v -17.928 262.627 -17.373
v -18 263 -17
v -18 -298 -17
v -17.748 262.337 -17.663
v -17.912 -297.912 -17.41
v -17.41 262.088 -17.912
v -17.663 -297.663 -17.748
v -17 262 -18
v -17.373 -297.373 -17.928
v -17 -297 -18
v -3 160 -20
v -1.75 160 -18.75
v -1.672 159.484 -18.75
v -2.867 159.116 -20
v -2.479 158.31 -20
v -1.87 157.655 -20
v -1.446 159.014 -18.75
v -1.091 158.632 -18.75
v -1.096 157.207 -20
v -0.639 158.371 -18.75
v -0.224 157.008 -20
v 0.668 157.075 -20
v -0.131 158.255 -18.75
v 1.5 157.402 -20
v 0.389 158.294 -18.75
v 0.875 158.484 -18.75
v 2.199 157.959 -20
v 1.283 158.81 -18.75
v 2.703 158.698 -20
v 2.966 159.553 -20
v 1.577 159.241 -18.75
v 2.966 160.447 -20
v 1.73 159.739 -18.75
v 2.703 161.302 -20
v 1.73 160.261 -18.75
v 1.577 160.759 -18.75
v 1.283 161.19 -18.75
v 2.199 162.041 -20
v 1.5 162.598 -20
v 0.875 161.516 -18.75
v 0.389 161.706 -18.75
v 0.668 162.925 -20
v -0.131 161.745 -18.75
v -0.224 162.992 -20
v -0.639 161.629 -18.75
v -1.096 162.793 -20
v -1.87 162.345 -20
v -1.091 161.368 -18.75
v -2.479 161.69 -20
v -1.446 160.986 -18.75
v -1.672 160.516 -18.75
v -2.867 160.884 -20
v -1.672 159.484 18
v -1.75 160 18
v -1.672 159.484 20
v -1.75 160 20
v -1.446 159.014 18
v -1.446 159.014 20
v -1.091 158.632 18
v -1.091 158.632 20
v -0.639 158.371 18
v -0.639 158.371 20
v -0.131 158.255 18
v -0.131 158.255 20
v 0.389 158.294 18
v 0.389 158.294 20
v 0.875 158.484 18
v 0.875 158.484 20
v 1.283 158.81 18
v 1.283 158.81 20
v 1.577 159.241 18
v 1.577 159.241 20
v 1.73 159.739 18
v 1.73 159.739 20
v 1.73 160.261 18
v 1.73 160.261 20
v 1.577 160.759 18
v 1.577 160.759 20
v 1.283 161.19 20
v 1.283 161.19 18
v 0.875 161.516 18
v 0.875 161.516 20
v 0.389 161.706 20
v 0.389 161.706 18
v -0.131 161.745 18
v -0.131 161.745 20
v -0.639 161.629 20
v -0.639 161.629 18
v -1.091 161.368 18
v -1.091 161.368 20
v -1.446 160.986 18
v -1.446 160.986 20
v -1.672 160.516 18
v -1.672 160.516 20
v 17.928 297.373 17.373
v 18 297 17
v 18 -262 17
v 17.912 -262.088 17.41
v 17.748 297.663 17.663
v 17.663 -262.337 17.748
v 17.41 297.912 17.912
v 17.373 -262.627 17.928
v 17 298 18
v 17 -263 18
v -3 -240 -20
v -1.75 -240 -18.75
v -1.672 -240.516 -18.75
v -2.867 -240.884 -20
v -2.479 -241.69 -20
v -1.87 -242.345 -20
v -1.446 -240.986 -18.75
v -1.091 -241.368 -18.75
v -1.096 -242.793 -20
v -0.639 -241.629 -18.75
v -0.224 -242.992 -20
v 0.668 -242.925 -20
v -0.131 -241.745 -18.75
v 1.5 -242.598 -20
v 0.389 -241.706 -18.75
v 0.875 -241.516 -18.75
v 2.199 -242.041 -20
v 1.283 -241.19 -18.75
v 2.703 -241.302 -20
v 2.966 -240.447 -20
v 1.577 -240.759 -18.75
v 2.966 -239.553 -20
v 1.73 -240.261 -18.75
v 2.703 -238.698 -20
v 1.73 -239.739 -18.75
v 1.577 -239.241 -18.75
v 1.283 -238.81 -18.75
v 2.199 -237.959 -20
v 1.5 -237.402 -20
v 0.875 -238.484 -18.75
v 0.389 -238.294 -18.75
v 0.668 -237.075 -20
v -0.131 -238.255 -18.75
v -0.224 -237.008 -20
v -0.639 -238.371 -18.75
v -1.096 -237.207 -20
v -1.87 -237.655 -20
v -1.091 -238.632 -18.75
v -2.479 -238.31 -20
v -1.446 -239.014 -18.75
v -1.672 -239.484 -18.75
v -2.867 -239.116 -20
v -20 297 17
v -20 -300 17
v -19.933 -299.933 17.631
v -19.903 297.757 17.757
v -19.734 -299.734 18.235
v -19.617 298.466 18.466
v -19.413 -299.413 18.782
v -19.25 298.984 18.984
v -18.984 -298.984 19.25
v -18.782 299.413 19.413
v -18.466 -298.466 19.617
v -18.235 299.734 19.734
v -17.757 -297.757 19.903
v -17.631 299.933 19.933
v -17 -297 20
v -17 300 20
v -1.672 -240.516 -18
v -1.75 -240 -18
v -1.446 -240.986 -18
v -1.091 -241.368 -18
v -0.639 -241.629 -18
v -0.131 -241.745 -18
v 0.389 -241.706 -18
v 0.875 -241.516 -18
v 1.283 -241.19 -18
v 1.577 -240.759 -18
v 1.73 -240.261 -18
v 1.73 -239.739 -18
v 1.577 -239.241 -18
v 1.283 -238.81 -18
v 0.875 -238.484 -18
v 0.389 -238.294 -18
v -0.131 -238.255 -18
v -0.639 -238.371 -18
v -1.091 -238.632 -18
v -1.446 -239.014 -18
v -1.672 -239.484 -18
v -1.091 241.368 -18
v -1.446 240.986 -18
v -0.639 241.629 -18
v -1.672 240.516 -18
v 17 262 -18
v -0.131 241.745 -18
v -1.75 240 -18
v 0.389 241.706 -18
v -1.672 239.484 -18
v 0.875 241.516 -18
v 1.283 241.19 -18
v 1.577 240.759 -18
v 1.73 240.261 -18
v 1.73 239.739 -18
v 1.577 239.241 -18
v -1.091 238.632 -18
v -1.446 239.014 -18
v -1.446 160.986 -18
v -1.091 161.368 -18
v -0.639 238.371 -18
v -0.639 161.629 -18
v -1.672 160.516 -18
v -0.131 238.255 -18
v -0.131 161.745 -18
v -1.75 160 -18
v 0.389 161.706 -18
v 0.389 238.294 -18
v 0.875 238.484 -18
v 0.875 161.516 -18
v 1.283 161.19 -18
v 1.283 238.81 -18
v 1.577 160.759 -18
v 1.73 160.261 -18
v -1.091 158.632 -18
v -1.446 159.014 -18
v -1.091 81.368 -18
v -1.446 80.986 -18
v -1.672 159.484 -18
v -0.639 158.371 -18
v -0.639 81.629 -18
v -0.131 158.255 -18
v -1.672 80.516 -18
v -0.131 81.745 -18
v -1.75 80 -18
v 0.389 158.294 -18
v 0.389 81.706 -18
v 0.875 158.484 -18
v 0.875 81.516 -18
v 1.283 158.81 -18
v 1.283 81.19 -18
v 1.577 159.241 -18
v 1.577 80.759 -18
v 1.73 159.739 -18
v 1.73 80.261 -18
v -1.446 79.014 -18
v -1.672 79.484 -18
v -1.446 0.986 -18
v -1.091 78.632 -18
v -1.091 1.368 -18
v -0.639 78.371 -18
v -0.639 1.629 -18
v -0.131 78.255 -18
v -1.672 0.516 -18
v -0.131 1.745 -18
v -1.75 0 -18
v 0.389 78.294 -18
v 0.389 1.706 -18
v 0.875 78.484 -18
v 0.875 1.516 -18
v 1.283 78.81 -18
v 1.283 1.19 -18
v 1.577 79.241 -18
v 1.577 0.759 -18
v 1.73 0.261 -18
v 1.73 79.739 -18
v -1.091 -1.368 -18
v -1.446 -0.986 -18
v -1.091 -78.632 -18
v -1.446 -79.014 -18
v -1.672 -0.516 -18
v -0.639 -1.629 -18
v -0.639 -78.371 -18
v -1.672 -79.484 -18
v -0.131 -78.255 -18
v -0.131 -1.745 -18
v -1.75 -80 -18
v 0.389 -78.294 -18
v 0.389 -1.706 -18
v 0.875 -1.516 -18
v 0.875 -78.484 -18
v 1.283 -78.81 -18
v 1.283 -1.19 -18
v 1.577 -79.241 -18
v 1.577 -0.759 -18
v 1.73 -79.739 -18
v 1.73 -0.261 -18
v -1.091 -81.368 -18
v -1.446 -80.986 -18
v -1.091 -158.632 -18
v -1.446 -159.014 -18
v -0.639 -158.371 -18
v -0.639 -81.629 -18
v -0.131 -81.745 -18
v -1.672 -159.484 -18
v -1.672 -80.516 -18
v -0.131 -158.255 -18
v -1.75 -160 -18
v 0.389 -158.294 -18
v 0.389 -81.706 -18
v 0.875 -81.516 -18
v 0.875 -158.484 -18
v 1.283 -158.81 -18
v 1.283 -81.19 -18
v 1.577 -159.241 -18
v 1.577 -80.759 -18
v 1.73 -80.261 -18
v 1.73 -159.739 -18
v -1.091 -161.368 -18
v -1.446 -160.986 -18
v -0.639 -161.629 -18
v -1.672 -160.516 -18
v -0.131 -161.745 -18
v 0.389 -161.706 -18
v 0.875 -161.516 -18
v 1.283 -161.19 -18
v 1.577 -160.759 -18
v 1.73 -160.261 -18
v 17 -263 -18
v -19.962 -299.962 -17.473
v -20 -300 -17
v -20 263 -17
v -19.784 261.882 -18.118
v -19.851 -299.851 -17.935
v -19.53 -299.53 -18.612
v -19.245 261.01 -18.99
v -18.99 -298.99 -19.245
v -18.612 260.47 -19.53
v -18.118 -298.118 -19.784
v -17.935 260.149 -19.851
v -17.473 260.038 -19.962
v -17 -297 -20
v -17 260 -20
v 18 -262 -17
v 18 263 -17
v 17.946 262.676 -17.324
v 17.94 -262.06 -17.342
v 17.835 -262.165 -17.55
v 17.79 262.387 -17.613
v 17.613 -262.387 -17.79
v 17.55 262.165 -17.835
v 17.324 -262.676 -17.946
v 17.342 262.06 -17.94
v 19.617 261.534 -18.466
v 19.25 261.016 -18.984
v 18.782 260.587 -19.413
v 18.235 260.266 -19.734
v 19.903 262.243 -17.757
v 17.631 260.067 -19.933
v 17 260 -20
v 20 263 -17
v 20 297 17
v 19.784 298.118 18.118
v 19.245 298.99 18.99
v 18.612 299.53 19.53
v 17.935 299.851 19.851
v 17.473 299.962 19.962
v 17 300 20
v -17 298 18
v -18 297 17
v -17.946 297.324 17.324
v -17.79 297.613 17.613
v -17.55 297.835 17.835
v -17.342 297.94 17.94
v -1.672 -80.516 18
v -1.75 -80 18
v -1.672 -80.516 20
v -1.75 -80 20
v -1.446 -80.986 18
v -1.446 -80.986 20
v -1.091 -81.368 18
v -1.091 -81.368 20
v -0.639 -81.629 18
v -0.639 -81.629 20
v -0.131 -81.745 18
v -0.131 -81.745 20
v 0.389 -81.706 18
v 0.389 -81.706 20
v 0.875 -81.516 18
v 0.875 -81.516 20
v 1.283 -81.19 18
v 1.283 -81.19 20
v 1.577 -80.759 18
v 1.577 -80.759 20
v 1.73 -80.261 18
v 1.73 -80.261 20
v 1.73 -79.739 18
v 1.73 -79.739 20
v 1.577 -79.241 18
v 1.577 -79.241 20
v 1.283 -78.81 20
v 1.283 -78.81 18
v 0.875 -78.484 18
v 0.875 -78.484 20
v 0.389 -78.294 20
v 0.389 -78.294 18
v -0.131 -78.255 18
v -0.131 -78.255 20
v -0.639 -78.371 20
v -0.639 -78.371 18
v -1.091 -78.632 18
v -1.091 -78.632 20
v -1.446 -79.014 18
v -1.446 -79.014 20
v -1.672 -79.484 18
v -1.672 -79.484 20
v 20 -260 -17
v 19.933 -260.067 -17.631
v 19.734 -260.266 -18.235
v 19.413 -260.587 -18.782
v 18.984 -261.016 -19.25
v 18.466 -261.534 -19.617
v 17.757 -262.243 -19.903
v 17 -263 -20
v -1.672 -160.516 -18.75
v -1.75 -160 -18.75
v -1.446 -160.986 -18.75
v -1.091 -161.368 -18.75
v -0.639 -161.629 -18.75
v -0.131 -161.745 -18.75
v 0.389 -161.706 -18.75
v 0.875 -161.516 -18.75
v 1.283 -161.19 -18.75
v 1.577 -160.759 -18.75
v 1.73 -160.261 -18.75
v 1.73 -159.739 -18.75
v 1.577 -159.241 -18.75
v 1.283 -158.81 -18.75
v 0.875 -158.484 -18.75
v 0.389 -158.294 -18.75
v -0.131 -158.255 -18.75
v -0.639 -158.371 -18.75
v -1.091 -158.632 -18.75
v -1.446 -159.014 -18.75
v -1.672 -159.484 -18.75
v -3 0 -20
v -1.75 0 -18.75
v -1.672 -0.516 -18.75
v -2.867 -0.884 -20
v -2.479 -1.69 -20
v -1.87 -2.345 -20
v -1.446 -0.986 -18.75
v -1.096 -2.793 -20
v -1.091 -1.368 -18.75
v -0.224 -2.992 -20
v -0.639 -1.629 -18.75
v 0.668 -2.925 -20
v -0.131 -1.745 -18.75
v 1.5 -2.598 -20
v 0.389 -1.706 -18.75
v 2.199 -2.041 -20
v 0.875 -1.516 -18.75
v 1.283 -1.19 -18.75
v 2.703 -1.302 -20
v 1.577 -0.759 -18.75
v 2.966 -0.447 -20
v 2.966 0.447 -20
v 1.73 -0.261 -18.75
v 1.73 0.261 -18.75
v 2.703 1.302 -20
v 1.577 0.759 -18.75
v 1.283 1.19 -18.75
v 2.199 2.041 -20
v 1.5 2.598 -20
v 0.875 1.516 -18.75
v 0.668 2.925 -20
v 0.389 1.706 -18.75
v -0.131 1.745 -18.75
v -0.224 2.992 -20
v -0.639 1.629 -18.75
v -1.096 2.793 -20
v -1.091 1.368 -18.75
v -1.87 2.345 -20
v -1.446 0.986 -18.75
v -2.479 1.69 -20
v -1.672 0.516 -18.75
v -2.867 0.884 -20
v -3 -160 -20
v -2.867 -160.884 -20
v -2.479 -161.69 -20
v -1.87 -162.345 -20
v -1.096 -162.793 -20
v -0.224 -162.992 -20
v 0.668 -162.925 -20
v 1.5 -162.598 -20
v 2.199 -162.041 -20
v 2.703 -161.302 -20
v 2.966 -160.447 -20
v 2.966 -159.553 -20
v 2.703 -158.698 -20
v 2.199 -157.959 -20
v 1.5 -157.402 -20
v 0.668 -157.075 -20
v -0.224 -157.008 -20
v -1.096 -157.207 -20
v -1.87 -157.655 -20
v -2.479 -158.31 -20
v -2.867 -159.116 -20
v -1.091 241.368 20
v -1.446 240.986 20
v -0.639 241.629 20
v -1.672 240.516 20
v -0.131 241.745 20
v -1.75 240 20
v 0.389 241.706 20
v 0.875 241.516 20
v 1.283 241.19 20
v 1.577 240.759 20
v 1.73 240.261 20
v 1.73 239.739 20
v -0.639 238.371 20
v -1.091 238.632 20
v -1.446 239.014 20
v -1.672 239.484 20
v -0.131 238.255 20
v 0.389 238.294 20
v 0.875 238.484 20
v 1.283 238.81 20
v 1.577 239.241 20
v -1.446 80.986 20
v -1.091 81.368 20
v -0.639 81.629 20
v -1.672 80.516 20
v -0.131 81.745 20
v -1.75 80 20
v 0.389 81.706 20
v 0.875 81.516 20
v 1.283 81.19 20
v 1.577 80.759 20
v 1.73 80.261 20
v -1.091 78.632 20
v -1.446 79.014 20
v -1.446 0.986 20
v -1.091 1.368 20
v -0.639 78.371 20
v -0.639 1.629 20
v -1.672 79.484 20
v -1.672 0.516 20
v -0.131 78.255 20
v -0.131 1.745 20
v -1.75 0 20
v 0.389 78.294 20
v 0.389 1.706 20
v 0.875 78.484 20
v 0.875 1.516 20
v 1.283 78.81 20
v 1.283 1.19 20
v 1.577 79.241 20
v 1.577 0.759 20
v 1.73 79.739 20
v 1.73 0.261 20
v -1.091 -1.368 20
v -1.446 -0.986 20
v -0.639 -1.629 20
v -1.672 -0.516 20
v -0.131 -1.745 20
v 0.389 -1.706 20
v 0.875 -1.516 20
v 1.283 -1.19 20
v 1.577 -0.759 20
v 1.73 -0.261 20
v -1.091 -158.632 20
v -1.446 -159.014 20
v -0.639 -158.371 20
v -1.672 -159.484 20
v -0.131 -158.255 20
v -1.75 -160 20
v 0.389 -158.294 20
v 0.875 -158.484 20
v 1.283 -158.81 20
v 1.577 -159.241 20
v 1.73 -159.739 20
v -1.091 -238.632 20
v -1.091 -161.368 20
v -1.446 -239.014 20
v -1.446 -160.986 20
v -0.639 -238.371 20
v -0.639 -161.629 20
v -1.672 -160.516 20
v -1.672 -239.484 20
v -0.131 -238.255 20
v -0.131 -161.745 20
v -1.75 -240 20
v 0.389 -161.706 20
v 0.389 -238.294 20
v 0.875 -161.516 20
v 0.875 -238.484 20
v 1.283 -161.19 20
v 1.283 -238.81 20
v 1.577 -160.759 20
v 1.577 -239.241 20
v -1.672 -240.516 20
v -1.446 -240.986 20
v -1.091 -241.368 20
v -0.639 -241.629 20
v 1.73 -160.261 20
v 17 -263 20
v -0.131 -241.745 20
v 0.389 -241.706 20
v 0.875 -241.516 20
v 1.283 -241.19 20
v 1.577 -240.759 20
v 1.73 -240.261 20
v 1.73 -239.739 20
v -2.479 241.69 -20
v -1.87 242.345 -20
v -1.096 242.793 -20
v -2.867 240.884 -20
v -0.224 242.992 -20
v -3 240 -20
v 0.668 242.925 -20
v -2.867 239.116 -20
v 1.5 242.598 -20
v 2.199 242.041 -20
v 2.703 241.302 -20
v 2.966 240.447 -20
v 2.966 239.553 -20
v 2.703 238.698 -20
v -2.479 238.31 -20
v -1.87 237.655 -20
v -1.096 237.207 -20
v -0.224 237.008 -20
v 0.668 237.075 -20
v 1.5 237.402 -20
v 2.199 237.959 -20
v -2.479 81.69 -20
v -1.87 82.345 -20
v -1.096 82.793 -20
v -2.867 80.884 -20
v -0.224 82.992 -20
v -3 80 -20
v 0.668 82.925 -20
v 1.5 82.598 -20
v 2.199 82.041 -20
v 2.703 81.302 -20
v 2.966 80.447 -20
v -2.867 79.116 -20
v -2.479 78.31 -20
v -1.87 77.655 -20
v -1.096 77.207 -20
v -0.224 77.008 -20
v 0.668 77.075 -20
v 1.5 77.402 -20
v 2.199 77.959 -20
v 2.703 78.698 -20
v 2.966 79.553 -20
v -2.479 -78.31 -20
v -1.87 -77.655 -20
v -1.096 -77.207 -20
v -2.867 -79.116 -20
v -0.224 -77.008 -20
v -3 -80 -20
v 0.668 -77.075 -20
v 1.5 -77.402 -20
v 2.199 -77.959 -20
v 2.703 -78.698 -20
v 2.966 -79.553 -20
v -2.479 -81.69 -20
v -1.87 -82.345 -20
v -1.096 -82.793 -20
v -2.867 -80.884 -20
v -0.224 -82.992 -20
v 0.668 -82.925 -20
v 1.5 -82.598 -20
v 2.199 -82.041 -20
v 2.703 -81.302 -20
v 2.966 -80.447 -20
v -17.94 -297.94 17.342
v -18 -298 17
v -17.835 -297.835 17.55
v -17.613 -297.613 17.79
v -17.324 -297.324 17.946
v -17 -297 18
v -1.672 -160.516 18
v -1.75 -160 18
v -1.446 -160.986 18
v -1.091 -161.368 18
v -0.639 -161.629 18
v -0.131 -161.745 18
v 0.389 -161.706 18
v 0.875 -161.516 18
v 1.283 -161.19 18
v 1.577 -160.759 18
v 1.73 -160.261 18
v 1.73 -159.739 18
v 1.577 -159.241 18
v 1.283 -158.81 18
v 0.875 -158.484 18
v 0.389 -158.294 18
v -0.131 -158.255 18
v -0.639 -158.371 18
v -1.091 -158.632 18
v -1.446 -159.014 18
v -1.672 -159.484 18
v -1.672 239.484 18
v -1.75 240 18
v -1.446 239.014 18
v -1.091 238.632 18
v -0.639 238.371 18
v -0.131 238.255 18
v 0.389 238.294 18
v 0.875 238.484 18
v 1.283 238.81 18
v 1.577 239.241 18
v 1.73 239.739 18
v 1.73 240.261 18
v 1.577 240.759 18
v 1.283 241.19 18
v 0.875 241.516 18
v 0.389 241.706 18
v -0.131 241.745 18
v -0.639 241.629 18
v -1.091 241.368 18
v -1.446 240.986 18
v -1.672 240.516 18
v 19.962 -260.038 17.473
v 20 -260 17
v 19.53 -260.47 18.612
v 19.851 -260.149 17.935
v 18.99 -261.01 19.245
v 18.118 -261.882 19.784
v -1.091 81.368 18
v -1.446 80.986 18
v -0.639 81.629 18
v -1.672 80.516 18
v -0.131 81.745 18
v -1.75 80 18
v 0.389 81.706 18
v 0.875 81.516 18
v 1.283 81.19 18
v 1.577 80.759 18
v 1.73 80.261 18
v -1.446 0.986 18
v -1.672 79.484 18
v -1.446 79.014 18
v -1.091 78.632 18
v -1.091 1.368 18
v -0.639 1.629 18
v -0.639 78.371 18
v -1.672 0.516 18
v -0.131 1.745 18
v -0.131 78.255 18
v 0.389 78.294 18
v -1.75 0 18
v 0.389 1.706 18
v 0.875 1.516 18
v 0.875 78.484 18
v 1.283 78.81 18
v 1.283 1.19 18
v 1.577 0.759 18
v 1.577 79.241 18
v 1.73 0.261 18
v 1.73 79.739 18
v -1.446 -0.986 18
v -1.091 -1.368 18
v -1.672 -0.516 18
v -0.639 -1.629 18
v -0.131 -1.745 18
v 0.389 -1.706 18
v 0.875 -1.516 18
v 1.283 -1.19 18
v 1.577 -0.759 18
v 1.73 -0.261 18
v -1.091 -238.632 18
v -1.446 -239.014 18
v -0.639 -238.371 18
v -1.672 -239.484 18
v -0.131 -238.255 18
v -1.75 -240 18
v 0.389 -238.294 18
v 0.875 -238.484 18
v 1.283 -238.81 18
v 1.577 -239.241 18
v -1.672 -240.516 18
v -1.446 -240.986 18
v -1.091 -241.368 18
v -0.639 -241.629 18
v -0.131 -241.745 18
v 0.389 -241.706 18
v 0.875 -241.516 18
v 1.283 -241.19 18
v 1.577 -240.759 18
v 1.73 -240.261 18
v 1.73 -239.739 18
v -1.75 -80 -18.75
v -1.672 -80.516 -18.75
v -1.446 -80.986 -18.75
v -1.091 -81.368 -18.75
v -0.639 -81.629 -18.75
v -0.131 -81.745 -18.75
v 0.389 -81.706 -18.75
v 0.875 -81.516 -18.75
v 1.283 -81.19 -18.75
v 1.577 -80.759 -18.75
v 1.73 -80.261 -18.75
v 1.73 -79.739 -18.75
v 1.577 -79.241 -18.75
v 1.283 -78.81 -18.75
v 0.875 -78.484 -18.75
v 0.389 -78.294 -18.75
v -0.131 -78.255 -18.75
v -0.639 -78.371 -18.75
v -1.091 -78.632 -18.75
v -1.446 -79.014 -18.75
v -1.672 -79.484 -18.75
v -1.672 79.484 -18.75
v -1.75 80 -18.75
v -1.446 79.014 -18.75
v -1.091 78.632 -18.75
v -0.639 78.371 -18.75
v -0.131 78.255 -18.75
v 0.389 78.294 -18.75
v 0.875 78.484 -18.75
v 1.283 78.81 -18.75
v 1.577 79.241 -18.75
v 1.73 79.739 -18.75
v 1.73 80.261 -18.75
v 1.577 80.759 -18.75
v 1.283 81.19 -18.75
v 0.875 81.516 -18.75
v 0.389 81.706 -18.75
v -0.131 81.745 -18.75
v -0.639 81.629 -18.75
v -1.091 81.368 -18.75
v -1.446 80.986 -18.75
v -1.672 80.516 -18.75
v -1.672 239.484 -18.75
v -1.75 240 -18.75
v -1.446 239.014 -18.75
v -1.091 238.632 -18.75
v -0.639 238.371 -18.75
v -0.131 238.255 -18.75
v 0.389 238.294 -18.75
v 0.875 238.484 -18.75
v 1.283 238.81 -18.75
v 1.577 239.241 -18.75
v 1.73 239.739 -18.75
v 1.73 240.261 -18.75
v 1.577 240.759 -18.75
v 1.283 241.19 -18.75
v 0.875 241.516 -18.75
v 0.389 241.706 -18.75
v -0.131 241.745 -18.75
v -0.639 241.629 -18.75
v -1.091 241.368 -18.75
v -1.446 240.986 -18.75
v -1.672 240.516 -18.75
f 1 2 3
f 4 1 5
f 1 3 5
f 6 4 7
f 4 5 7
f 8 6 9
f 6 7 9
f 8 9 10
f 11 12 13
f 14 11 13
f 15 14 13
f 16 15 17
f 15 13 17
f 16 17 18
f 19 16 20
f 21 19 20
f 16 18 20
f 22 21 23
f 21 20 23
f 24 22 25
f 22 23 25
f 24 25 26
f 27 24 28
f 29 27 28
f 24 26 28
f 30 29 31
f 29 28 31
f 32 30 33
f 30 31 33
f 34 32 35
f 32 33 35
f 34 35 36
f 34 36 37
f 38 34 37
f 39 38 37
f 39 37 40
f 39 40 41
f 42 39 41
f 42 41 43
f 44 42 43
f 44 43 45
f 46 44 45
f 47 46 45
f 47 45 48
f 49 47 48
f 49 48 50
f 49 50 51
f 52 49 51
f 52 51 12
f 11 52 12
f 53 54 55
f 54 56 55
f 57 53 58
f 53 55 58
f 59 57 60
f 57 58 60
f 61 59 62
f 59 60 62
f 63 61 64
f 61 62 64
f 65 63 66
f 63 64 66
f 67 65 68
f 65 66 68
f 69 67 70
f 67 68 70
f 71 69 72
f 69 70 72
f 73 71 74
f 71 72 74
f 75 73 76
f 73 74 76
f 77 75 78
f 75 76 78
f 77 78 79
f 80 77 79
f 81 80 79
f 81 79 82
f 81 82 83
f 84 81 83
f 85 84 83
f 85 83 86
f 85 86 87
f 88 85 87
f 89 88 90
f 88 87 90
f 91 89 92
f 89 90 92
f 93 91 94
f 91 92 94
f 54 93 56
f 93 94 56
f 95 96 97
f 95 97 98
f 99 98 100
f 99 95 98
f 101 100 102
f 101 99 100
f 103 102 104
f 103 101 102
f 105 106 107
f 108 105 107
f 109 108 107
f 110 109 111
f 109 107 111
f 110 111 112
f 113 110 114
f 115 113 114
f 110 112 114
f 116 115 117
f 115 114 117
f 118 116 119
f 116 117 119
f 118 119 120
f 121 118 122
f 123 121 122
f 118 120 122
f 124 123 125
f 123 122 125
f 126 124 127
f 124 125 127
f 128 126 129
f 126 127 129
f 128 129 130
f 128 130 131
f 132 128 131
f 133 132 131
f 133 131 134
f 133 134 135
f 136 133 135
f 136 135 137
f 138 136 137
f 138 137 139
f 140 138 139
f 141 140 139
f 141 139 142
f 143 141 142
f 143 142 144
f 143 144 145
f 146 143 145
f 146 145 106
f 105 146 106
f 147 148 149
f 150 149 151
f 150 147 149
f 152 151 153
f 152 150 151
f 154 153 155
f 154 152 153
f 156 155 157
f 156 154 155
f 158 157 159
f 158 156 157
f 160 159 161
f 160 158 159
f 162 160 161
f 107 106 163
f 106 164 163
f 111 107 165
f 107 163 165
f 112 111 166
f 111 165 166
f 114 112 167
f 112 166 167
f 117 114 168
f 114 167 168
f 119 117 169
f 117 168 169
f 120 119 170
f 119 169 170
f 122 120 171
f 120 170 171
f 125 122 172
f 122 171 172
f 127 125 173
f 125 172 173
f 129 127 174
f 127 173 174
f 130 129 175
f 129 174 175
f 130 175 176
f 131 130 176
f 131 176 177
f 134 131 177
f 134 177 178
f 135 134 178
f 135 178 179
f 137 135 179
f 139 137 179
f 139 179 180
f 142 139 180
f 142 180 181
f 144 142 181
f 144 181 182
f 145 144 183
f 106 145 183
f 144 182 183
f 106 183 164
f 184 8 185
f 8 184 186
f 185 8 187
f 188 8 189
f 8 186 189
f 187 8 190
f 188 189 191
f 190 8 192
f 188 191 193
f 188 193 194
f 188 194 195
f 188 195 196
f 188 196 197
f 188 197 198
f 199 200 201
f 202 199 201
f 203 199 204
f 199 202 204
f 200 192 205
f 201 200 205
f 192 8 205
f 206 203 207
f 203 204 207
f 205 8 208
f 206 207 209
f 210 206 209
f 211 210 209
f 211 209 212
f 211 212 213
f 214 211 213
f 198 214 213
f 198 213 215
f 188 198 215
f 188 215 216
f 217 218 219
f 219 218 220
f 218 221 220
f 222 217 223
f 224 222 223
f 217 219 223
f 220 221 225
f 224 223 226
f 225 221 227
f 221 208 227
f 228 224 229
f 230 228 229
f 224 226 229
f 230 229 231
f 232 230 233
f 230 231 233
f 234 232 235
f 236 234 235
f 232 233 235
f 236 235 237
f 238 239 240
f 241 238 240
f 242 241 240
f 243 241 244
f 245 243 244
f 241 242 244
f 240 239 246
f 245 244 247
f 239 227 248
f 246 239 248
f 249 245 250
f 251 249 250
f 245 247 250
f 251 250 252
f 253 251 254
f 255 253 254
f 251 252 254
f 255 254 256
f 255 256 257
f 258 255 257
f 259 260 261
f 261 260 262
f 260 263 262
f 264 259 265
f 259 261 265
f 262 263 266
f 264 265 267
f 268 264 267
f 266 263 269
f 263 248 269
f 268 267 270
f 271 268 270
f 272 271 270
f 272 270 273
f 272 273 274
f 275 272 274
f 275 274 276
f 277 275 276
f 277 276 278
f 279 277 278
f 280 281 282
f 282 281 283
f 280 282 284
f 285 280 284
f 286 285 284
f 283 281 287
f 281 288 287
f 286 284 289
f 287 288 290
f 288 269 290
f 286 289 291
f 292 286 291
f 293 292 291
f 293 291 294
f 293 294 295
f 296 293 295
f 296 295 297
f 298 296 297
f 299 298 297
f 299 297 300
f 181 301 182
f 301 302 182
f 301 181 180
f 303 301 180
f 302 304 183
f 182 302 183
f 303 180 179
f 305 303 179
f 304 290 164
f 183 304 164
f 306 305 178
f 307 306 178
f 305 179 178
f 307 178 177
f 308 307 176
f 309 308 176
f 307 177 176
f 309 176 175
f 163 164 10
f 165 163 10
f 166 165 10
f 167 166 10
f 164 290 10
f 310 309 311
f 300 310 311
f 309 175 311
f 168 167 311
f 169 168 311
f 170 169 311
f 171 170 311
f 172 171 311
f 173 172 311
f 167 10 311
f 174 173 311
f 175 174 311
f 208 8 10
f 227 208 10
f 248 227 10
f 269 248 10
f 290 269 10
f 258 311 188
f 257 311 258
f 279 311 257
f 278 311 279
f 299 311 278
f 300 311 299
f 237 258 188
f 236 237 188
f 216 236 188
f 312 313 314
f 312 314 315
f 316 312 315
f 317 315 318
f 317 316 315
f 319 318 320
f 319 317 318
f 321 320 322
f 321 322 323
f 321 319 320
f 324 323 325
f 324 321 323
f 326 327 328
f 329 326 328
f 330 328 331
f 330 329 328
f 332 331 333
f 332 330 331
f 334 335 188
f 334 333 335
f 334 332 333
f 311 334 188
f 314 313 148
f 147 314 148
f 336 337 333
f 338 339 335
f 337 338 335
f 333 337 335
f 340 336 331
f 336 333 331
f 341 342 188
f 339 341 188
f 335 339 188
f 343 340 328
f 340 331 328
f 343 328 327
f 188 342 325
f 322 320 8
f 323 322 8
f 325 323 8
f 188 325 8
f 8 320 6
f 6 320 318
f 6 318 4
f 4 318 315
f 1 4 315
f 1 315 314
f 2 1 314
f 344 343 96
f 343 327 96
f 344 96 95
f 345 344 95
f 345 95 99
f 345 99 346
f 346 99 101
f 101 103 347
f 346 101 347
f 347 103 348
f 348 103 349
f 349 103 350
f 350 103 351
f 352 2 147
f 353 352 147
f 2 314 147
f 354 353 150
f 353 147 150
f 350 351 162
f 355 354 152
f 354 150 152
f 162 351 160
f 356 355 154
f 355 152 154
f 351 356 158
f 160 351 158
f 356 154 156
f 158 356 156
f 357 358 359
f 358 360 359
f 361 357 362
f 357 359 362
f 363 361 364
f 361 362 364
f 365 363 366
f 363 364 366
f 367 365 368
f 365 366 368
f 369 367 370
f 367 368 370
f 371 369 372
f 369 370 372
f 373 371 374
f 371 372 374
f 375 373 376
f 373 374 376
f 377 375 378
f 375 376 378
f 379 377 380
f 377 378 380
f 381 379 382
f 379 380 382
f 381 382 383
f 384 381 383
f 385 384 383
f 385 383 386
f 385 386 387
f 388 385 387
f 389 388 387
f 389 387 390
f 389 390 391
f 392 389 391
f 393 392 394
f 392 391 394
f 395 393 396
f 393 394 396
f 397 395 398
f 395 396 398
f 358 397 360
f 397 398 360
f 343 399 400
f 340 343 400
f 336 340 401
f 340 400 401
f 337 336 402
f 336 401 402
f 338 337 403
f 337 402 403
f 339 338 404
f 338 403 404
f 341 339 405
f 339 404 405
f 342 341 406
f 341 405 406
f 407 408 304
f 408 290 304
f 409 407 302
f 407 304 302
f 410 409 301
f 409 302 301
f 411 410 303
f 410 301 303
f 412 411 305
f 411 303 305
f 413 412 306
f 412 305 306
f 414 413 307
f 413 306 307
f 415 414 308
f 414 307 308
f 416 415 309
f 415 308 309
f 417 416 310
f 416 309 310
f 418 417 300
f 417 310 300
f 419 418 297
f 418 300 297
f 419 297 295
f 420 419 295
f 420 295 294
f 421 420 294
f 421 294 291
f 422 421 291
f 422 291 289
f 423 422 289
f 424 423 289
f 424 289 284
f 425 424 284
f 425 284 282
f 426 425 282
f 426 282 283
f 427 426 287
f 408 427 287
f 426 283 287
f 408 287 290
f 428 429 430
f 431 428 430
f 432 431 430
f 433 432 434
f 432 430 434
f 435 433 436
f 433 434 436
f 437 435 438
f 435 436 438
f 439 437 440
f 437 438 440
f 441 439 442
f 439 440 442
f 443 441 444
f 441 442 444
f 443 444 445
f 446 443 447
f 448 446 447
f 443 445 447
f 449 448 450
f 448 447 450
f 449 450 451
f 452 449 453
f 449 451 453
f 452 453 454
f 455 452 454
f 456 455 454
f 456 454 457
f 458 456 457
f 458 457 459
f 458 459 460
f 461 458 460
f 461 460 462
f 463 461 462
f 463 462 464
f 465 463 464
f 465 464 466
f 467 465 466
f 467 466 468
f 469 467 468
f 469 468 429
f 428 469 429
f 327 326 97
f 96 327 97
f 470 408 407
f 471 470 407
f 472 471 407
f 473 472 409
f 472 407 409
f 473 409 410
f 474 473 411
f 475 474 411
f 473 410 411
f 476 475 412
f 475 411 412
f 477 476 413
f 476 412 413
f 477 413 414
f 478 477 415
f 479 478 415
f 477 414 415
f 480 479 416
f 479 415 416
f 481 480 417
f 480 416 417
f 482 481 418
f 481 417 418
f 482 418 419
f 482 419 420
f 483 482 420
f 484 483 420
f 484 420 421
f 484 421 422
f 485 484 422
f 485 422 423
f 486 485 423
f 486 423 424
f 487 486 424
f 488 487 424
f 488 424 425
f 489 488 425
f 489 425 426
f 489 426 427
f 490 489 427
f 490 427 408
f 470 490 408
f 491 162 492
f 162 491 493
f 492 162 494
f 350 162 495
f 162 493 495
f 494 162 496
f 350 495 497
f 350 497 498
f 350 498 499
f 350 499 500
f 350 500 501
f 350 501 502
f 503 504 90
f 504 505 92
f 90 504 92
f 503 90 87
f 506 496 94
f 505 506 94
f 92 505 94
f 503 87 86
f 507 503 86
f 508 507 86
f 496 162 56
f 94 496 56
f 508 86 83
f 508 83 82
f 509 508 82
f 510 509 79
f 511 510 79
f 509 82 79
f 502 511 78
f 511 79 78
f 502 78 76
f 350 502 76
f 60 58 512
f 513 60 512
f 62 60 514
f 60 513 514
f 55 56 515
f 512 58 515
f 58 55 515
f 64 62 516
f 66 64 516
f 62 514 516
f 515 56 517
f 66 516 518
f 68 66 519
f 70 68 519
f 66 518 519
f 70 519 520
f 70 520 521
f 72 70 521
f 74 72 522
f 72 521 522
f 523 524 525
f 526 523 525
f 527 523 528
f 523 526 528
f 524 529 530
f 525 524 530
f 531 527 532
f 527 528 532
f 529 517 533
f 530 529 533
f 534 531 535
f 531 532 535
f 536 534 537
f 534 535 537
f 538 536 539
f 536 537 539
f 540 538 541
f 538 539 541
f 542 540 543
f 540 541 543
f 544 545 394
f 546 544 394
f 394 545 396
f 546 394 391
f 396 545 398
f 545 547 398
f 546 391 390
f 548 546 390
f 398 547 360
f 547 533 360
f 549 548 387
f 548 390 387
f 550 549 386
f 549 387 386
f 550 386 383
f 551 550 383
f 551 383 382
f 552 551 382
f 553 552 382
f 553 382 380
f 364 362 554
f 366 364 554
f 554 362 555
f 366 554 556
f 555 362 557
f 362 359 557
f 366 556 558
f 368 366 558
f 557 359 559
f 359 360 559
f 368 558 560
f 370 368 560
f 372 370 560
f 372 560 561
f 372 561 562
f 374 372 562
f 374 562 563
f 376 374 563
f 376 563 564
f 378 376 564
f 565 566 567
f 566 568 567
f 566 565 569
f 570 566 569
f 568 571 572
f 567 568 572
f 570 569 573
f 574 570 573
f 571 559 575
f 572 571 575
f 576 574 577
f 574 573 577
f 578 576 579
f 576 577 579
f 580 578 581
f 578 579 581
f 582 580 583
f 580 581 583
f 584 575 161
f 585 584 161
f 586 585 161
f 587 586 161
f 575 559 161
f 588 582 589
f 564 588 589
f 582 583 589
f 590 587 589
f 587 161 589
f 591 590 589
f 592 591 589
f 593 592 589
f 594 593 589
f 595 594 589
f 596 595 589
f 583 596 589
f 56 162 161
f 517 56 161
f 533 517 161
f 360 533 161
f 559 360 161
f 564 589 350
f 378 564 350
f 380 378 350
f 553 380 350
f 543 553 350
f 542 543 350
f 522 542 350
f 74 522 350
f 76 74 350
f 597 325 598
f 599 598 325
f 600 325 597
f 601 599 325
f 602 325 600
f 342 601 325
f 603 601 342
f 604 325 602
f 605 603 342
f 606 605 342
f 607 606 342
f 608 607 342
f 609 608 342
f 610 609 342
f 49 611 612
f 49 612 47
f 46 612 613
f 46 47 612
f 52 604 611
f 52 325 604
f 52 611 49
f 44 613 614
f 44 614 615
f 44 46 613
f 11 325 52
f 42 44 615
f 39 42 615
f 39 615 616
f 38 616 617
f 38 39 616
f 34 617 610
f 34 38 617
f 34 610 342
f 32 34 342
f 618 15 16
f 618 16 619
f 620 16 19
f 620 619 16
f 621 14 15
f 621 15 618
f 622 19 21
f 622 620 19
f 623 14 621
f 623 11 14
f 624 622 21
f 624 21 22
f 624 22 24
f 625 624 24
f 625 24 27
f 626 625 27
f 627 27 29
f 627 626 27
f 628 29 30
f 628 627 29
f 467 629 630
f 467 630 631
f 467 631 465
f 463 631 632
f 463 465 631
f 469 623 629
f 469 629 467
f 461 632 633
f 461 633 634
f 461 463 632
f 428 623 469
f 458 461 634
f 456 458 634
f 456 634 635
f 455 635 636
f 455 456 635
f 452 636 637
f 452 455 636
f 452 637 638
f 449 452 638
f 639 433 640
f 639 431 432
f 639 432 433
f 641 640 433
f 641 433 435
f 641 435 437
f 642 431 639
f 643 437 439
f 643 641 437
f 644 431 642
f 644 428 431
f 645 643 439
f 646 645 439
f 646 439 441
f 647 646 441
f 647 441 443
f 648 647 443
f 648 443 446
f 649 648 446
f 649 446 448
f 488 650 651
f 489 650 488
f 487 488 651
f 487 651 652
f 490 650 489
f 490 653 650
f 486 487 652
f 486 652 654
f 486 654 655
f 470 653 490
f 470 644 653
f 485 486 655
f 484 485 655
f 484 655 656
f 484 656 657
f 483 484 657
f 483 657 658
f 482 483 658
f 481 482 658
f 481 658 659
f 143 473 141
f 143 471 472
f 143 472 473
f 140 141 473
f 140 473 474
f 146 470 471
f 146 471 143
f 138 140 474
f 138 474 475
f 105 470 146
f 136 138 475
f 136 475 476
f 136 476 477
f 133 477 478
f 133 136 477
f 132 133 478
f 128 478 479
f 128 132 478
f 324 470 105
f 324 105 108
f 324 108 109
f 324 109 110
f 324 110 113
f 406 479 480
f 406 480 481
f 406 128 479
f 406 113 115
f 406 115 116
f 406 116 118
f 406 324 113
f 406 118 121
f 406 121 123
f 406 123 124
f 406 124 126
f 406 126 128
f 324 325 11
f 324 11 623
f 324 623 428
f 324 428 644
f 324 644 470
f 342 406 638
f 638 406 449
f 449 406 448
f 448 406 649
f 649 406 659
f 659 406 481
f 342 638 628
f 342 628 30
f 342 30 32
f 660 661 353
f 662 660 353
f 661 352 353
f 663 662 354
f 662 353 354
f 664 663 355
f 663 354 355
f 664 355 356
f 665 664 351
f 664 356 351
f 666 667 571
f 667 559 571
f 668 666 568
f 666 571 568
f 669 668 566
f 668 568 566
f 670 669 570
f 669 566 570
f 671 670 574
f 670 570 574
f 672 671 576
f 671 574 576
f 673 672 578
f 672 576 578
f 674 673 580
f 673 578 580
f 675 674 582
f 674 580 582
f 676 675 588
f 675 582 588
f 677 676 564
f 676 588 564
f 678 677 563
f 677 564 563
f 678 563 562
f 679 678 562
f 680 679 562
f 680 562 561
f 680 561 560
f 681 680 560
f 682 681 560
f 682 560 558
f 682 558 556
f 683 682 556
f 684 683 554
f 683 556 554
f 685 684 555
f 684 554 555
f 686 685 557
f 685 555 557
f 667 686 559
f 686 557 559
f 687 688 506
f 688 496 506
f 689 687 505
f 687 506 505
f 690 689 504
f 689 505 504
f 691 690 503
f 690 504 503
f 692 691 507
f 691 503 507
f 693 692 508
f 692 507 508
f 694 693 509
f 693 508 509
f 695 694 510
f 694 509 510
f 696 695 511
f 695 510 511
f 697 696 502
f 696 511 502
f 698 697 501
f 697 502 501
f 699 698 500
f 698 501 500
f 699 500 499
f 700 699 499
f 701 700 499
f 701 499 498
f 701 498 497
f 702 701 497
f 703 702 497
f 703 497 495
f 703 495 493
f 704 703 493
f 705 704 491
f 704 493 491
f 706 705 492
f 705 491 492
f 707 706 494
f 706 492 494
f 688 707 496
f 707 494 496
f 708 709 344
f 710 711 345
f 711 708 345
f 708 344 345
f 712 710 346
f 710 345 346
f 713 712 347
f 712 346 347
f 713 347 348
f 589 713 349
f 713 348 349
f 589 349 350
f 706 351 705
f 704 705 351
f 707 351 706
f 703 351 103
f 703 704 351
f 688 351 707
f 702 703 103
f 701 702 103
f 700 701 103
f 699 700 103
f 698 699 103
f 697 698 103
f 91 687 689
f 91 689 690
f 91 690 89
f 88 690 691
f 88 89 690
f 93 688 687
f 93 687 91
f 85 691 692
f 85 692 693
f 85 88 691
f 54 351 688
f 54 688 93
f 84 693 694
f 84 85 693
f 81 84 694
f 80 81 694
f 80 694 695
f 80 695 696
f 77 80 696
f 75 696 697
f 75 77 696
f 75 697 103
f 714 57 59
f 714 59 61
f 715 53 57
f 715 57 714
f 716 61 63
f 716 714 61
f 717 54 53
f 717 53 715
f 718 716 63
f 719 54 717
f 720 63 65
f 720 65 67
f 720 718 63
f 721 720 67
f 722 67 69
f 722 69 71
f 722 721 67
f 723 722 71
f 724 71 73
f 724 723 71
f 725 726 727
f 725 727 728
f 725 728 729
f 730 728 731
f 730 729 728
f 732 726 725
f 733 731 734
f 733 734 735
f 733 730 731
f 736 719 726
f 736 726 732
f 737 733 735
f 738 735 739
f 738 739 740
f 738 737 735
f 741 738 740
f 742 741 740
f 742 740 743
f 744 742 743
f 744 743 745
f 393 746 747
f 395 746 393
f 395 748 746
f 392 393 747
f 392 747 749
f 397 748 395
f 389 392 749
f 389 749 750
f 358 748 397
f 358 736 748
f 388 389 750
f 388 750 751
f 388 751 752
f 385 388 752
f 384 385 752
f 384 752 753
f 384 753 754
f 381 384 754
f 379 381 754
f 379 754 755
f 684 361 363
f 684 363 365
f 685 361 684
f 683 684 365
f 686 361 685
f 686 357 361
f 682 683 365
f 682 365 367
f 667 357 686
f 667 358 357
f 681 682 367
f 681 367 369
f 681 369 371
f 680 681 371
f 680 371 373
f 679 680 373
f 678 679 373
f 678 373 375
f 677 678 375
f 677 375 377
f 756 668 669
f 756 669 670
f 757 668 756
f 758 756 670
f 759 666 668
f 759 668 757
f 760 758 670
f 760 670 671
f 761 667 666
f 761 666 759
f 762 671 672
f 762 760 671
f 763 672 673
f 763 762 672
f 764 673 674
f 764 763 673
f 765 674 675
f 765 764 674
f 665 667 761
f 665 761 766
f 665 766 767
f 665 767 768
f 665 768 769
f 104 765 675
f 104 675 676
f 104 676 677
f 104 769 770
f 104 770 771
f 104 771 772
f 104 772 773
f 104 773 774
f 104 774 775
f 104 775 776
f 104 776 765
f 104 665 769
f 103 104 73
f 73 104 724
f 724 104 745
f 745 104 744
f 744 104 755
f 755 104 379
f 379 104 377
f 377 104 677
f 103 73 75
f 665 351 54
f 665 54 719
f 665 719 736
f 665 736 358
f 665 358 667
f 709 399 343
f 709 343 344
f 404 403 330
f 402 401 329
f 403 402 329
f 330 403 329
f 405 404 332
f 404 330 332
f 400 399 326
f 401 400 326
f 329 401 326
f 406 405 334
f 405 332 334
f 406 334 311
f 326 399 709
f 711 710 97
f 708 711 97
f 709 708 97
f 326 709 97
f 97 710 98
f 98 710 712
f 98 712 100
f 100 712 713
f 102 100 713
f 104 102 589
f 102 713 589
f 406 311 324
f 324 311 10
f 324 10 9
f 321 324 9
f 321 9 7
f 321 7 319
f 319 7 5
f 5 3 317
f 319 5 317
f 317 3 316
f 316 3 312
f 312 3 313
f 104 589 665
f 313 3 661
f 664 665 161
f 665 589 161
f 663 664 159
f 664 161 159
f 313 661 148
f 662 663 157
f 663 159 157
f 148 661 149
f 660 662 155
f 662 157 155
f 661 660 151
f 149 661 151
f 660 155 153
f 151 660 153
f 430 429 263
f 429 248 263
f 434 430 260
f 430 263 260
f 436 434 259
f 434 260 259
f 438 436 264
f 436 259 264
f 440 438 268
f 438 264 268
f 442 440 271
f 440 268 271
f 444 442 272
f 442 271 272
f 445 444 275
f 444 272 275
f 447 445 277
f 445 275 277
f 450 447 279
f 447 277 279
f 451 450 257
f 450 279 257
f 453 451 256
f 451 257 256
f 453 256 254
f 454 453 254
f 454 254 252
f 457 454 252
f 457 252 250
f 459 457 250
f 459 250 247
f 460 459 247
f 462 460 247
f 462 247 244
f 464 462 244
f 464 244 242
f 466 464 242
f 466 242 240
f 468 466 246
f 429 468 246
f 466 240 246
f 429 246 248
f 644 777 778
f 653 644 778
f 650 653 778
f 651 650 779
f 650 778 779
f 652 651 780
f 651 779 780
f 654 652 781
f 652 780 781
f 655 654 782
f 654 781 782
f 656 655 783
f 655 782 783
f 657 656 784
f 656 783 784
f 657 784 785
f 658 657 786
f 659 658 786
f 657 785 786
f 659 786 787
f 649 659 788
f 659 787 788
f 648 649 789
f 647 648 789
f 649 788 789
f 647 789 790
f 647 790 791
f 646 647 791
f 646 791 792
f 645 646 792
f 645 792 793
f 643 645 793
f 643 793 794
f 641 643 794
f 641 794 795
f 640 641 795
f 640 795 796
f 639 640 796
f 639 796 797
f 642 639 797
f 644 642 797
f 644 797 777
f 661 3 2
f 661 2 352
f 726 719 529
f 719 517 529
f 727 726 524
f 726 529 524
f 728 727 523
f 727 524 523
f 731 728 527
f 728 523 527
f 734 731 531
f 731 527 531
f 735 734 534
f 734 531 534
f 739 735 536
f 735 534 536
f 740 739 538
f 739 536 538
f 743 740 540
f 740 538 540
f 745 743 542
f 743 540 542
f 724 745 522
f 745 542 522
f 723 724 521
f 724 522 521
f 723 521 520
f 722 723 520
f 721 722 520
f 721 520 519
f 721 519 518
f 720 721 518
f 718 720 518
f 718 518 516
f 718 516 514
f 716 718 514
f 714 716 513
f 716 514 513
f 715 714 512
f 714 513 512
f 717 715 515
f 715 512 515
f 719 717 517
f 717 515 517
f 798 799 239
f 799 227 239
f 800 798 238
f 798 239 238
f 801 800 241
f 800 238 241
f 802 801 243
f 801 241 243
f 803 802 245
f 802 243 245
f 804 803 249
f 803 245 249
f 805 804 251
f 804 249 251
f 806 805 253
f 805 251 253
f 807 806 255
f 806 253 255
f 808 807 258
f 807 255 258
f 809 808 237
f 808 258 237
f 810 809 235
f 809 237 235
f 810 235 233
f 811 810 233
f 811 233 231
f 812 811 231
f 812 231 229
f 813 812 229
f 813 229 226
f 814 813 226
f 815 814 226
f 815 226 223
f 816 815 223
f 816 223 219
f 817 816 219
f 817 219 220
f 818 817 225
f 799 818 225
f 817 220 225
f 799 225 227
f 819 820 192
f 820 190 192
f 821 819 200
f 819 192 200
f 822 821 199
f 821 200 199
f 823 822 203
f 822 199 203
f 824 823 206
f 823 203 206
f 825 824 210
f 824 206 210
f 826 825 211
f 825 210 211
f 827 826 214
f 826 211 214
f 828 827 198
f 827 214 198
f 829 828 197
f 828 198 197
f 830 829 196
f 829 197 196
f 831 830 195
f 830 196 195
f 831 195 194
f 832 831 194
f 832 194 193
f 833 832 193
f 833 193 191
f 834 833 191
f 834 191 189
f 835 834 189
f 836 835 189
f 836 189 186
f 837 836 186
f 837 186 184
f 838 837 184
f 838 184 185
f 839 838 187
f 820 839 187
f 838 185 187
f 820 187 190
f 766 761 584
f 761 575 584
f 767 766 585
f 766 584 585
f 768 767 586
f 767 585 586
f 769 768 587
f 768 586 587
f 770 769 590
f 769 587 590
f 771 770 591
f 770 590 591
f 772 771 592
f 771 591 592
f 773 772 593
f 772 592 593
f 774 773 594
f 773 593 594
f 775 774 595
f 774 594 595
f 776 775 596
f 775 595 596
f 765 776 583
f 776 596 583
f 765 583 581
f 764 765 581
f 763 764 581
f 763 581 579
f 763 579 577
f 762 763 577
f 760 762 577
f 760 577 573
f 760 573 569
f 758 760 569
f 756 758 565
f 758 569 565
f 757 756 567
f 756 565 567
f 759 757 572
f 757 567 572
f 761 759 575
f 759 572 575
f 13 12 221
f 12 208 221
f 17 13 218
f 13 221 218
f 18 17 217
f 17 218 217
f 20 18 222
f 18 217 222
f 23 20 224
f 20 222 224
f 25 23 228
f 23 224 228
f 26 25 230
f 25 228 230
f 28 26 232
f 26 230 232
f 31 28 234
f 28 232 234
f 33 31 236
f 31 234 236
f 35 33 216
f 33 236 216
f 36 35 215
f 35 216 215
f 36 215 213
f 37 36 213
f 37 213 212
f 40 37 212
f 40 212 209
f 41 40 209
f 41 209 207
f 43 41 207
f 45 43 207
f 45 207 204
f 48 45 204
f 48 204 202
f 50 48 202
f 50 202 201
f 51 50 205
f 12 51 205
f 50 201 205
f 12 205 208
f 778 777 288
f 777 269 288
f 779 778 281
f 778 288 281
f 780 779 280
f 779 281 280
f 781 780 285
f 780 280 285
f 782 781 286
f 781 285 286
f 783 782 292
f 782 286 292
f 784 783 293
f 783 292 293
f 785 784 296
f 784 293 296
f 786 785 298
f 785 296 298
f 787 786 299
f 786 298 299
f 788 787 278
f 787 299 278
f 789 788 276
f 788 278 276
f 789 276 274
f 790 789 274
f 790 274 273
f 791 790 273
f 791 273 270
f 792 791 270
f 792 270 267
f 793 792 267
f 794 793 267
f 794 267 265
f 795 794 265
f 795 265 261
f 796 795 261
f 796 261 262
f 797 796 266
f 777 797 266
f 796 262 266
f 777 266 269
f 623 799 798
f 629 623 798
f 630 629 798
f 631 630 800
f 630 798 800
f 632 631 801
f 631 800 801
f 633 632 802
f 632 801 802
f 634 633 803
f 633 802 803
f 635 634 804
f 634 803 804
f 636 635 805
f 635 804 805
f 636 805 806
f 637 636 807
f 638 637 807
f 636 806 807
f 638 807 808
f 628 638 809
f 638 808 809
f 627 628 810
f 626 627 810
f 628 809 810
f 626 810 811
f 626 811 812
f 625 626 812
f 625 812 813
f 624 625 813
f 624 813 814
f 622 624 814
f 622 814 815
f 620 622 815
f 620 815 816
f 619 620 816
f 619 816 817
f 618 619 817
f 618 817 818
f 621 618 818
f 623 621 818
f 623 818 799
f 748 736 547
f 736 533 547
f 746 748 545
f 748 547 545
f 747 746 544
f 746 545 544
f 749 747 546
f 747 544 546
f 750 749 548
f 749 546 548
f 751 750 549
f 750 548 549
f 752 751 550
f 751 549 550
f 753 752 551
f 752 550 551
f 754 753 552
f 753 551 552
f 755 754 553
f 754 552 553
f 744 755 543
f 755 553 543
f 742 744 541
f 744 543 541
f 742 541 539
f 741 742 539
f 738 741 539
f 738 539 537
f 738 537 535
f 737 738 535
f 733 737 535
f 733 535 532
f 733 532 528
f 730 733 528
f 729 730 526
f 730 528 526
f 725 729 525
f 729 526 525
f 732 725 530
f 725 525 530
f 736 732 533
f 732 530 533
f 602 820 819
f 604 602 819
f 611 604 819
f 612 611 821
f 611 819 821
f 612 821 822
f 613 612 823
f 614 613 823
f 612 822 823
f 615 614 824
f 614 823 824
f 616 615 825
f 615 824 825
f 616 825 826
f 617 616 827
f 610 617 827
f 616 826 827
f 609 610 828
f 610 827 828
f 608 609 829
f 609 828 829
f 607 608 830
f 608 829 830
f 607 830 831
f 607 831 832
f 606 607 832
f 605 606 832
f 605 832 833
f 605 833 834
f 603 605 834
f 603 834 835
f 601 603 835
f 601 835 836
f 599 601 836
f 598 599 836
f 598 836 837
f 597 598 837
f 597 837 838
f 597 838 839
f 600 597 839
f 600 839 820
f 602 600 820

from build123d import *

# Parameters (mm, degrees)
F2_W            = 40
F2_H            = 40
F3_DEPTH        = 300
F4_R            = 3
F5_T            = -2
F7_DEPTH        = 40.001
F9_DEPTH        = 40.001
F11_D           = 3.5
F11_CSINK_D     = 6
F11_CSINK_ANGLE = 90


with BuildPart() as f3:
    # F2 (on Front) → F3 (new body, symmetric)
    with BuildSketch(Plane.XZ):
        Rectangle(F2_W, F2_H)
    extrude(amount=F3_DEPTH, both=True)

    # F4
    f4_edges = [f3.edges().sort_by_distance(p)[0] for p in [
        (20, 0, 20),
        (-20, 0, 20),
        (20, 0, -20),
        (-20, 0, -20),
    ]]
    fillet(f4_edges, radius=F4_R)

    # F5
    f5_openings = [f3.faces().sort_by_distance(p)[0] for p in [
        (0, -300, 0),
        (0, 300, 0),
    ]]
    offset(amount=F5_T, openings=f5_openings)

    # F6 (on face) → F7 (cut, through all)
    with BuildSketch(Plane(origin=(-20, 0, 0), x_dir=(0, -1, 0), z_dir=(-1, 0, 0))):
        Polygon((-300, 20), (-300, -20), (-260, -20), align=None)
    extrude(amount=-F7_DEPTH, mode=Mode.SUBTRACT)

    # F8 (on face) → F9 (cut, through all)
    with BuildSketch(Plane.XY.offset(20)):
        Polygon((20, -300), (20, -260), (-20, -300), align=None)
    extrude(amount=-F9_DEPTH, mode=Mode.SUBTRACT)

    # F11 (through all)
    with Locations(Plane(origin=(0, 0, -20), x_dir=(1, 0, 0), z_dir=(0, 0, -1))):
        with Locations((0, 240), (0, 160), (0, 80), (0, 0), (0, -80), (0, -160), (0, -240)):
            CounterSinkHole(F11_D / 2, F11_CSINK_D / 2, counter_sink_angle=F11_CSINK_ANGLE)


solid = f3.part
